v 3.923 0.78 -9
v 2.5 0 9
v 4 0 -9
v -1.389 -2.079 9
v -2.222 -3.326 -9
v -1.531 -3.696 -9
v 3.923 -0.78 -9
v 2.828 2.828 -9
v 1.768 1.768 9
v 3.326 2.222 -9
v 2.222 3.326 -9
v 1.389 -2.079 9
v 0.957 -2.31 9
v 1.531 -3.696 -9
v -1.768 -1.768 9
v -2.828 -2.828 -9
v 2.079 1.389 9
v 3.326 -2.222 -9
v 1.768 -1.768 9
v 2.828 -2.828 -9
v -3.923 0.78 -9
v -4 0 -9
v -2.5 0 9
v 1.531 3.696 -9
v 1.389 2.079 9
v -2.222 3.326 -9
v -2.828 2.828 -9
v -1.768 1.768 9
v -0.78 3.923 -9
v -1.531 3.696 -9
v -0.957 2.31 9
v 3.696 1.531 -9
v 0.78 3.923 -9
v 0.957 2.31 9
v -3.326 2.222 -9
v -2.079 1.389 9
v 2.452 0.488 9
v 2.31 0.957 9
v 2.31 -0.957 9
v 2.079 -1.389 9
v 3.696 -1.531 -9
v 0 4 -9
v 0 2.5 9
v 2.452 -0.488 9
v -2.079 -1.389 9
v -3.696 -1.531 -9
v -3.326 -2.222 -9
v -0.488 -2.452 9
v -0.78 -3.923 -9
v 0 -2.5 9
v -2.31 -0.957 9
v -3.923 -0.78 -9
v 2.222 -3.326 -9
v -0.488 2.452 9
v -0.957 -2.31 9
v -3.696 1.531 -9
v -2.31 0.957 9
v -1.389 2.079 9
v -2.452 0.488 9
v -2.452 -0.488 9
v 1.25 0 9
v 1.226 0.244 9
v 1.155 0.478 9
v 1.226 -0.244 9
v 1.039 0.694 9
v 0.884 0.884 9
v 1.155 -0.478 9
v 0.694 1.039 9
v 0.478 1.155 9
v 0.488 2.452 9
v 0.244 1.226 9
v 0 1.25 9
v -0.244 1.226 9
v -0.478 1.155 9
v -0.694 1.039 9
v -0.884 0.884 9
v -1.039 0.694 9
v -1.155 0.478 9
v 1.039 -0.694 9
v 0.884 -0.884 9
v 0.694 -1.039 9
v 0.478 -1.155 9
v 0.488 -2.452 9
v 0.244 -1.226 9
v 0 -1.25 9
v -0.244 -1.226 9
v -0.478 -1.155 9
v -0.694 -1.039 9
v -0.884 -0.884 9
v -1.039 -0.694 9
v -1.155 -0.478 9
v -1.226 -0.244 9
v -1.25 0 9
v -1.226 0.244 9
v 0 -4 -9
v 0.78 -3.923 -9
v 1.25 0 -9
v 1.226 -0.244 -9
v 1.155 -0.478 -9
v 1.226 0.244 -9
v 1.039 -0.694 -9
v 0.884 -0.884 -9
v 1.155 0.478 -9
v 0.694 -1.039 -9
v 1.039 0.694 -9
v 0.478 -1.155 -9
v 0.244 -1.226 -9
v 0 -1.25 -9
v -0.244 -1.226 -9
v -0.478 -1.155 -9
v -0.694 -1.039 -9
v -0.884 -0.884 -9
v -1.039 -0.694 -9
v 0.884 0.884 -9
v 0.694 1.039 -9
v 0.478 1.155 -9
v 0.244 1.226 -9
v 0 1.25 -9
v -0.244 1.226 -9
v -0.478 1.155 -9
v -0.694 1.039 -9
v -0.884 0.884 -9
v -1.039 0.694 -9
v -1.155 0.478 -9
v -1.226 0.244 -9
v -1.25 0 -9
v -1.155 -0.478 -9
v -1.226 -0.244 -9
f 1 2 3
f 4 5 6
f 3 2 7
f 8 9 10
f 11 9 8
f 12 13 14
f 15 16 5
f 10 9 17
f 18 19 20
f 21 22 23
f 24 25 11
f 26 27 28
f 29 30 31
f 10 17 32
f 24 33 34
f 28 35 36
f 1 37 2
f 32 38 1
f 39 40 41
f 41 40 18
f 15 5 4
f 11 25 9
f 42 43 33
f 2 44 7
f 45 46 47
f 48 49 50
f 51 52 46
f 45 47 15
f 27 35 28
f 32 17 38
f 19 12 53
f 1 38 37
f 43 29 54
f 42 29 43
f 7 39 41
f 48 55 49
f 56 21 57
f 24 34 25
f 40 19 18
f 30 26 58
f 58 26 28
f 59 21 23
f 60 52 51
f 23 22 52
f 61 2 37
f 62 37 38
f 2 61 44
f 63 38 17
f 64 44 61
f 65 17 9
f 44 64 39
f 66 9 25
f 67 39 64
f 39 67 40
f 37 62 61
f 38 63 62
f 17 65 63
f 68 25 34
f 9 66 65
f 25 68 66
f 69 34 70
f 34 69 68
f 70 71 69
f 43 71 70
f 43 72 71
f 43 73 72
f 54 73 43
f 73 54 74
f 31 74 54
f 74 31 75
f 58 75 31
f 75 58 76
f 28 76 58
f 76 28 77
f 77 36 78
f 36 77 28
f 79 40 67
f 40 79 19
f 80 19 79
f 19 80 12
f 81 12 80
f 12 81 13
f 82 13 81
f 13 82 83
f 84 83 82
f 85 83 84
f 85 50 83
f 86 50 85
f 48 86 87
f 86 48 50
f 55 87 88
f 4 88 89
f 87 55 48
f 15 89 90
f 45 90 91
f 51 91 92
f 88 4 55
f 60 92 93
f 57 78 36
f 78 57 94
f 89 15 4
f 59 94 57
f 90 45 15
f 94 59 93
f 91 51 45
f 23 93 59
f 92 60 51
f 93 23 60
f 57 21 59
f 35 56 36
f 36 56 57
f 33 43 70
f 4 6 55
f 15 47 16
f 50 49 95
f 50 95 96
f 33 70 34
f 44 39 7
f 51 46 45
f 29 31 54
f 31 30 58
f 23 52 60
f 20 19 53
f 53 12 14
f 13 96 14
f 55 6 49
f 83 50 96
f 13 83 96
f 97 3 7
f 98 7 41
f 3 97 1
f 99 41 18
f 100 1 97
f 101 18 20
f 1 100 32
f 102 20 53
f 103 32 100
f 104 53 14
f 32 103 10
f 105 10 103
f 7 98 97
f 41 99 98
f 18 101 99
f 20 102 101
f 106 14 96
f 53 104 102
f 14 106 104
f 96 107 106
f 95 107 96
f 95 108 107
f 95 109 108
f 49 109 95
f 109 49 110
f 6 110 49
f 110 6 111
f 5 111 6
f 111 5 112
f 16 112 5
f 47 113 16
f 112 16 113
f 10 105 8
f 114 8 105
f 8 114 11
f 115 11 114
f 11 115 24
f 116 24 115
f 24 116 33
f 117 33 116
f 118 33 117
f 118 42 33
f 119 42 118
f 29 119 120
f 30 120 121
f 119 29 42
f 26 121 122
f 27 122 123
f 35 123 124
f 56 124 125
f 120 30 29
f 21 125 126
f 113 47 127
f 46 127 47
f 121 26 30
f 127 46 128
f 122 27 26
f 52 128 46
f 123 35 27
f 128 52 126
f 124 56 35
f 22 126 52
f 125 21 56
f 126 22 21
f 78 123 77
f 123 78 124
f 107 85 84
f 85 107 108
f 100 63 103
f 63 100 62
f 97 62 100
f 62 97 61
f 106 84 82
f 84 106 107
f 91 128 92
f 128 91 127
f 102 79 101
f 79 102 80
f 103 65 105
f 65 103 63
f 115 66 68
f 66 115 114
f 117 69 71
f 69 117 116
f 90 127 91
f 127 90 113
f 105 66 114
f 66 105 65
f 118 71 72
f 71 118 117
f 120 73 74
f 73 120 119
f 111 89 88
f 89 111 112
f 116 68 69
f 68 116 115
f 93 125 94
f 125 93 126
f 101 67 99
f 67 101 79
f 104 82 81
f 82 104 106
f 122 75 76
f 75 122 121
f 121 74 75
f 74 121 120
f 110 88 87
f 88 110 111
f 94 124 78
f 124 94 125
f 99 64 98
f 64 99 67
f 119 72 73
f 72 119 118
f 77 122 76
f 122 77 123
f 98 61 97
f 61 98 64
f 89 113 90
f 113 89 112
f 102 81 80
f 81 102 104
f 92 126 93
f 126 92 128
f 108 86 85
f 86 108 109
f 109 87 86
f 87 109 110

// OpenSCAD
difference(){
    $fn=32;
    cylinder(r1=4, r2=2.5, h=18, center=true);
    cylinder(r=1.25, h=20, center=true);
}
